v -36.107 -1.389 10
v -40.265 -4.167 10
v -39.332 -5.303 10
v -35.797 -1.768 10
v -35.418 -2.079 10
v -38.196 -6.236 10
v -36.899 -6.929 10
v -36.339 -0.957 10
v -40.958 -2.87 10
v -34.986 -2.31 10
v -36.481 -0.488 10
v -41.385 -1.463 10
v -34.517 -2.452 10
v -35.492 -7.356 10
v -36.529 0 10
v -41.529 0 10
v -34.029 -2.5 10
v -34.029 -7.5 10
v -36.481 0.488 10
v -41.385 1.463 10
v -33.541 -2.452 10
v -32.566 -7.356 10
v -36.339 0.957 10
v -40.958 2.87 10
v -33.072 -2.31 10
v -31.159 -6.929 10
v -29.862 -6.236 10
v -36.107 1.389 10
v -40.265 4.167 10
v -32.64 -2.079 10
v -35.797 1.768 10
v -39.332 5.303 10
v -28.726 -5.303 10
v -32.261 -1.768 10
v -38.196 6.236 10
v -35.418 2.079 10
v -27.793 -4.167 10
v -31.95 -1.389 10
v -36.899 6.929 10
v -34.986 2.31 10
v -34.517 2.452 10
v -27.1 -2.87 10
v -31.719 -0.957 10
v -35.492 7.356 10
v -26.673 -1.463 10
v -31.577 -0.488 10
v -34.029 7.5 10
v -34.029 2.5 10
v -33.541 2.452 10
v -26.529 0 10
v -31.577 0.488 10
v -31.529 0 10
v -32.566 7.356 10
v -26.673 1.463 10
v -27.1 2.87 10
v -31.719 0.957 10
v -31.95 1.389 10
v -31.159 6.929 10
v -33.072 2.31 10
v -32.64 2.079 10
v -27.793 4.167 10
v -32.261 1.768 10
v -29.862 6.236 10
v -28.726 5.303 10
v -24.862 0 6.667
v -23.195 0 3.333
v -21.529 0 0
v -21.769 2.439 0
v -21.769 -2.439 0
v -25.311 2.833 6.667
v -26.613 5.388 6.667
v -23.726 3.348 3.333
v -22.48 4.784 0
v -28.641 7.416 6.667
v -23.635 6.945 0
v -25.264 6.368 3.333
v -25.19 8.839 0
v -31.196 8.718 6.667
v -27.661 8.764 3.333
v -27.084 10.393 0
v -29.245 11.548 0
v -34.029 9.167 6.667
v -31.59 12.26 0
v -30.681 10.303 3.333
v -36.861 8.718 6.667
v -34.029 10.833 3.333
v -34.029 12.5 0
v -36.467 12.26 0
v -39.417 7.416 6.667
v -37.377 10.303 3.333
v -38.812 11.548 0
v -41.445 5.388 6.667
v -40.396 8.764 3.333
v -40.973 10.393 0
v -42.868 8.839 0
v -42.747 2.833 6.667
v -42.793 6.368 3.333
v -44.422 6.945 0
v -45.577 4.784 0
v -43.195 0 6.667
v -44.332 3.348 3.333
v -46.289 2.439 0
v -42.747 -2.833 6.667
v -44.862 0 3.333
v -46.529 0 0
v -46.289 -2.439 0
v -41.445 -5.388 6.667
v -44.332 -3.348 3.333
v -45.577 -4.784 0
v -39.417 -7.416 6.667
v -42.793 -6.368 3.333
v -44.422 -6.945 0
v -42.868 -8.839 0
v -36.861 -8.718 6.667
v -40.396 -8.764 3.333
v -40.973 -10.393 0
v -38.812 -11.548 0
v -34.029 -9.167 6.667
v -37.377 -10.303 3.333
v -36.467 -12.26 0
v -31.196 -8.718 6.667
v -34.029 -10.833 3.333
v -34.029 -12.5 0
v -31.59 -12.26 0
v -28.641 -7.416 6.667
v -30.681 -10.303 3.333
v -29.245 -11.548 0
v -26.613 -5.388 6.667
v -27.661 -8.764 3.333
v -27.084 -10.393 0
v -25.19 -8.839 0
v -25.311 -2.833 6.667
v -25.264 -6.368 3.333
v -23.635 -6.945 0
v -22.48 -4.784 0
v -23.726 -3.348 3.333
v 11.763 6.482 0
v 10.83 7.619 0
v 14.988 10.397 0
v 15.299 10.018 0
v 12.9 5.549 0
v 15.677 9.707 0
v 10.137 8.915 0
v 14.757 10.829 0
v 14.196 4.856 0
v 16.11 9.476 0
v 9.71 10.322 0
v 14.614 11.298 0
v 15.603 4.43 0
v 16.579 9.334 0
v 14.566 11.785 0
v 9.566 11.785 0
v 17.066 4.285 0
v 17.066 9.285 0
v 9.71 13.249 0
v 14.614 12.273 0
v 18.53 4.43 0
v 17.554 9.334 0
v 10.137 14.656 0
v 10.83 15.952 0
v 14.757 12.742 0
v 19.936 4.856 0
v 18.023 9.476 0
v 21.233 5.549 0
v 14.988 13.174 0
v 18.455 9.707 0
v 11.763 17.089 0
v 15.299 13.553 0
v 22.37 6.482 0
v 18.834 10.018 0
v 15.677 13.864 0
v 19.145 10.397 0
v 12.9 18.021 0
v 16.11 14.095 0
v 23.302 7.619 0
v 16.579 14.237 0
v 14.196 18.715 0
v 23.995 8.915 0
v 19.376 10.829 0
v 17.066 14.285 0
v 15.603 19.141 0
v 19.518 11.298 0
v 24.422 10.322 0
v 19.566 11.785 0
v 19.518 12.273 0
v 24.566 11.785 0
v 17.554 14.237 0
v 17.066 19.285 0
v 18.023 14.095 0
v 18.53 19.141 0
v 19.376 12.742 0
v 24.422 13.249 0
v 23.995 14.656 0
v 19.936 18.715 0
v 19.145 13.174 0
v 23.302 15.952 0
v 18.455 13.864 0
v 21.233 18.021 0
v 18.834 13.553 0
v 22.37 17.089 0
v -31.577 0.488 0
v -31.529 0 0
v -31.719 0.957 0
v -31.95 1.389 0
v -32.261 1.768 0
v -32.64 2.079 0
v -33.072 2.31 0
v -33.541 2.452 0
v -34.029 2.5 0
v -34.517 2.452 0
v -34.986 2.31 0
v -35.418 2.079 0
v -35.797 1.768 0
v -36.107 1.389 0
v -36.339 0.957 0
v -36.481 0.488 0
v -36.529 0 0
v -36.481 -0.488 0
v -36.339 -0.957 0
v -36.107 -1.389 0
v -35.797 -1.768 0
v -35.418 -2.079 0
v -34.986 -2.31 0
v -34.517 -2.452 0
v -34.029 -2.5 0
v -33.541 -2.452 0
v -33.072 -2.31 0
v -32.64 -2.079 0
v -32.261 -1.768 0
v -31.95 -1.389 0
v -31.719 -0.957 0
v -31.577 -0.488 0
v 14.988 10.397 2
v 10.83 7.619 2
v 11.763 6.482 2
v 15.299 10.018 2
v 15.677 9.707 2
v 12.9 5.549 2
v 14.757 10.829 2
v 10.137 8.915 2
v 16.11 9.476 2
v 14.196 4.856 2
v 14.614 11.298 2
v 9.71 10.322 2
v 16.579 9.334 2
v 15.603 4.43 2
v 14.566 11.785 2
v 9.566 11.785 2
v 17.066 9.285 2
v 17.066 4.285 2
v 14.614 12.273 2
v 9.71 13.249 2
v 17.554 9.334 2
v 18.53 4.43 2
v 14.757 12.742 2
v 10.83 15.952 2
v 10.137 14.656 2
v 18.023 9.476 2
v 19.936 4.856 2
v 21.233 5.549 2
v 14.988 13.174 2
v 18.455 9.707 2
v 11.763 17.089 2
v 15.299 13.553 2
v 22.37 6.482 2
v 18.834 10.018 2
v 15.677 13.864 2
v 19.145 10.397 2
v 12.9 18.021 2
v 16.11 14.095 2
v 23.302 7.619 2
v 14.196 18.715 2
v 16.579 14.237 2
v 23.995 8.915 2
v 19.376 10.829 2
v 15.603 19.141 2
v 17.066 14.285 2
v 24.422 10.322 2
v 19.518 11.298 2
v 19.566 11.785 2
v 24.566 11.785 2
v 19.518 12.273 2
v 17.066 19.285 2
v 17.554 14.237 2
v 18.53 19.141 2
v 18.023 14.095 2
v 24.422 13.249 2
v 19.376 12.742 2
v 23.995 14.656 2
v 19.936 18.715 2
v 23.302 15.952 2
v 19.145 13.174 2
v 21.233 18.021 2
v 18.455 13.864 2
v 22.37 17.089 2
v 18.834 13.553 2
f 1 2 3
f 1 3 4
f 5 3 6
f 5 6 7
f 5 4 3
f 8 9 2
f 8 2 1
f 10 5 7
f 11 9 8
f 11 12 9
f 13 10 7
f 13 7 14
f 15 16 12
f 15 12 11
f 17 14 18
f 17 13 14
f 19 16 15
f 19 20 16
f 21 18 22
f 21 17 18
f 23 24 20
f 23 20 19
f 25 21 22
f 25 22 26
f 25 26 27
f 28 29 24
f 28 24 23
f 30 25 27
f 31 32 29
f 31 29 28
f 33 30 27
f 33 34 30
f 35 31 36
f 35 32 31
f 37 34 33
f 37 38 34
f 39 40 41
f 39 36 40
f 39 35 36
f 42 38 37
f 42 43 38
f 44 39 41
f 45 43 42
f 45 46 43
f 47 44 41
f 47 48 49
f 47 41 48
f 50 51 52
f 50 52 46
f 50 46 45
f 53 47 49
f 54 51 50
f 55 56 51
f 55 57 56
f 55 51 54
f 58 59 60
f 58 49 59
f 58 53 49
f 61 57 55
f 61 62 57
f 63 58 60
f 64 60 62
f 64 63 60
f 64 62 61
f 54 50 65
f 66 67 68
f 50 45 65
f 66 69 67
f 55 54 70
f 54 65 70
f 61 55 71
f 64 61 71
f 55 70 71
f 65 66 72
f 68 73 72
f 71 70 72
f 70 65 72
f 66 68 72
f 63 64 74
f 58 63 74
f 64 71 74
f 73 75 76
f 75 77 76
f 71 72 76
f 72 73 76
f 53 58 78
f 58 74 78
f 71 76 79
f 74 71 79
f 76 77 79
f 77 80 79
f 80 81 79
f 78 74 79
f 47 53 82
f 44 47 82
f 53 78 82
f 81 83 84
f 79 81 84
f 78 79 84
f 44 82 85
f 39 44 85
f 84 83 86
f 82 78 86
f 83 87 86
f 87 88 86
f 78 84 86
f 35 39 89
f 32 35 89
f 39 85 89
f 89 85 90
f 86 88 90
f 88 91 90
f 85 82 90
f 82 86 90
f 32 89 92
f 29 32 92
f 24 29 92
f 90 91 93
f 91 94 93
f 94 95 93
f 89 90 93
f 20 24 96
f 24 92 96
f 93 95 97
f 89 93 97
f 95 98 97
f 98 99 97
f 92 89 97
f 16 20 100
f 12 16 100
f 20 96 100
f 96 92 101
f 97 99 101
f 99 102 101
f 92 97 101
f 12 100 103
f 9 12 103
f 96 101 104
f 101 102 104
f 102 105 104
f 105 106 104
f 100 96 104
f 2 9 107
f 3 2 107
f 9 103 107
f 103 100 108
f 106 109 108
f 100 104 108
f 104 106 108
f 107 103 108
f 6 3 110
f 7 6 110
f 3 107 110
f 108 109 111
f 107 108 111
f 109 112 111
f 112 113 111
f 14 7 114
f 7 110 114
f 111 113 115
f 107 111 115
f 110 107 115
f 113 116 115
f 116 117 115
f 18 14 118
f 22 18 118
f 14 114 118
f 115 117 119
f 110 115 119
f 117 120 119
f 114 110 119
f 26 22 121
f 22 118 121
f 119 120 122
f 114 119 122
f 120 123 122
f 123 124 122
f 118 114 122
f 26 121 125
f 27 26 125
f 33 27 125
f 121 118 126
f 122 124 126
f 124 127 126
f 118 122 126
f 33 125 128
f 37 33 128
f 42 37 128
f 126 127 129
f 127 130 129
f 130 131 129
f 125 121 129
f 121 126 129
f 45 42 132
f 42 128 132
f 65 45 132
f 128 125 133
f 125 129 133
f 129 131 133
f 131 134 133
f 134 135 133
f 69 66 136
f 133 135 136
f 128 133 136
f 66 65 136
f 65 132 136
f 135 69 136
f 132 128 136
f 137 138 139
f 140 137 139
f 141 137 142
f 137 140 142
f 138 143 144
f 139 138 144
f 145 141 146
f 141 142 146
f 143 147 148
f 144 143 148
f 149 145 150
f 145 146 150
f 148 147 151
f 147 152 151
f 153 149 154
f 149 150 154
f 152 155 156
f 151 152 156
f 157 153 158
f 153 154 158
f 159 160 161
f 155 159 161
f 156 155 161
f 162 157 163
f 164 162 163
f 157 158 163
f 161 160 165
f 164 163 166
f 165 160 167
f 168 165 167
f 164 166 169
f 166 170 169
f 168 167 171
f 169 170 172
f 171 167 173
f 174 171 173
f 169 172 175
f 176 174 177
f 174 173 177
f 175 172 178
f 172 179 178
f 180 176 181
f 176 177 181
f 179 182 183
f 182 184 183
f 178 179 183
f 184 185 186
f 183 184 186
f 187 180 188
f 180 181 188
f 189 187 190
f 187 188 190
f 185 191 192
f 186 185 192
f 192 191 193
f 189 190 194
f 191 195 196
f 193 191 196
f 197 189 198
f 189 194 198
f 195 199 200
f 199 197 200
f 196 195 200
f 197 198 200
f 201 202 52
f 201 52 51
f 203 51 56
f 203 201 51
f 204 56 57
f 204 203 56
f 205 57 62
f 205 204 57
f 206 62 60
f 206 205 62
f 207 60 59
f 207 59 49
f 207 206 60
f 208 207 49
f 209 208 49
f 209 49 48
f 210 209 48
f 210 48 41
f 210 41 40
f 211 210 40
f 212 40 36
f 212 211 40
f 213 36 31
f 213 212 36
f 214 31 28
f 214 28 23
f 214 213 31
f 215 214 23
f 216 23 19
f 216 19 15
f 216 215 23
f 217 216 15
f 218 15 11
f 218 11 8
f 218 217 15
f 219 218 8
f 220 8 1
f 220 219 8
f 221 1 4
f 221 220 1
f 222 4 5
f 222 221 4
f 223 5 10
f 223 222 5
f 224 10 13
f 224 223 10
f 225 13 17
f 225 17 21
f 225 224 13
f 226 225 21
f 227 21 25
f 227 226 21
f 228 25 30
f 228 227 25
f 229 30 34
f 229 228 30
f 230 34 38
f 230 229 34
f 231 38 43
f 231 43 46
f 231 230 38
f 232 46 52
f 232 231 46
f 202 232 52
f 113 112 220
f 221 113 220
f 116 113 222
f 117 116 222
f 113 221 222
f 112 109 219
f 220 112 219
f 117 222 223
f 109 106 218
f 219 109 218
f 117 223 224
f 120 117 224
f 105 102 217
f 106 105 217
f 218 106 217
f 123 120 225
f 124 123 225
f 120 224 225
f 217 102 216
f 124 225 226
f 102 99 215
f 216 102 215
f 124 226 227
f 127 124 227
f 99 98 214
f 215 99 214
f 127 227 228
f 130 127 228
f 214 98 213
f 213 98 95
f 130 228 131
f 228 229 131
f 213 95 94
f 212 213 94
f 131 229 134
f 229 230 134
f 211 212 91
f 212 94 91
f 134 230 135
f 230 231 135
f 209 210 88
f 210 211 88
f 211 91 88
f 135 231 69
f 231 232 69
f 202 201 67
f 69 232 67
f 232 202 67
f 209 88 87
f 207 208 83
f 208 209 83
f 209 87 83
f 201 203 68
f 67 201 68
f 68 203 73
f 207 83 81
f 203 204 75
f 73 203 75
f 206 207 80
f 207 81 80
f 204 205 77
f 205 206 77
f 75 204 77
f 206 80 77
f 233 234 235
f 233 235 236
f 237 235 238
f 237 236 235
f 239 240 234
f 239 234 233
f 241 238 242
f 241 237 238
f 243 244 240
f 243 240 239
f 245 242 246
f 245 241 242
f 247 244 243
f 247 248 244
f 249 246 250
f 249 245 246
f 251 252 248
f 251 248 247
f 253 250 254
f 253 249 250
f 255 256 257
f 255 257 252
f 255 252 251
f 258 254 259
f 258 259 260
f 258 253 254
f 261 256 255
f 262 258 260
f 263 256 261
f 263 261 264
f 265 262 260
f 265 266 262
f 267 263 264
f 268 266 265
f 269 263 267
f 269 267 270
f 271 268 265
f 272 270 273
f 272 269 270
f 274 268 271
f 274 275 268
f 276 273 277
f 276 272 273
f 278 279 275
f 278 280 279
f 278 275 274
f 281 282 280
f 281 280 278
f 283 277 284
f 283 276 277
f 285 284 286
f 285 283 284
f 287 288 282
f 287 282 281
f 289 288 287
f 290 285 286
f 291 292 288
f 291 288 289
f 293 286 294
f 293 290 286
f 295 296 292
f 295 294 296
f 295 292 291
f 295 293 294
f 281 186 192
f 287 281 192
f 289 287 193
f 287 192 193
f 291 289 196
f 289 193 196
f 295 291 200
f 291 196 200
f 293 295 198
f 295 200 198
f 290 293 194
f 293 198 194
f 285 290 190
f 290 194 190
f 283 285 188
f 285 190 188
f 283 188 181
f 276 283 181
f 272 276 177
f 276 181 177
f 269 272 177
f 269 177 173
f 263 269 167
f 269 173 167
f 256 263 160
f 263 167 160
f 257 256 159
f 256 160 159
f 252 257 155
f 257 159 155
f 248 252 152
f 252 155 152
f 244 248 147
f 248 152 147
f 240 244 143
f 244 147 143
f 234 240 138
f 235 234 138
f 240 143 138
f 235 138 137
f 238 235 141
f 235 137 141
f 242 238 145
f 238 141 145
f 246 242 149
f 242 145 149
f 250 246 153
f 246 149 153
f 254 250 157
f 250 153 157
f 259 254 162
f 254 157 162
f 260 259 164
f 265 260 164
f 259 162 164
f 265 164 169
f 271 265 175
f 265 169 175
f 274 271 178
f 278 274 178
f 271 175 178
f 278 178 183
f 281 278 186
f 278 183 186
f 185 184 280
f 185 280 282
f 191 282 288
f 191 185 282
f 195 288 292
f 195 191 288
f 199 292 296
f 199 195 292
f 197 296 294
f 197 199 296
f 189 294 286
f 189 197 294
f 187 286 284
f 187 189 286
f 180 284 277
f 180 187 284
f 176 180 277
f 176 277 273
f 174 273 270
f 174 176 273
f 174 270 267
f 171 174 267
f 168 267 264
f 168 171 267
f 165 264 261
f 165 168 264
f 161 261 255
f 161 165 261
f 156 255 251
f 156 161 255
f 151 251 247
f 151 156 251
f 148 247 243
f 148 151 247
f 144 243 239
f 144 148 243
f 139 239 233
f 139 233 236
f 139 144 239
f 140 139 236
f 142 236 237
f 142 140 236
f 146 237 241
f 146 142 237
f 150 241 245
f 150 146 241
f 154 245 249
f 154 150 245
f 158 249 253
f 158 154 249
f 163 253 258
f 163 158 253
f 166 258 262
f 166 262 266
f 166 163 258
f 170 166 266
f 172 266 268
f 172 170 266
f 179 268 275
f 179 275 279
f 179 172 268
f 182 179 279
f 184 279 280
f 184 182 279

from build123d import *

# Parameters (mm, degrees)
F0_R     = 12.5
F0_R_2   = 2.5
F1_DEPTH = 10
F0_R_3   = 7.5
F2_DEPTH = 2
F3_SIZE2 = 9.99999
F3_SIZE  = 4.99999


# Not quite as in the source:
# - a fillet or chamfer is up to 0.001 mm smaller than in the source, because OpenCascade refuses the exact size


with BuildPart() as f1:
    # F0 (on Top) → F1 (new body)
    with BuildSketch(Plane.XY):
        with Locations((-34.0288244188, 0)):
            Circle(F0_R)
        with Locations((-34.0288244188, 0)):
            Circle(F0_R_2, mode=Mode.SUBTRACT)
    extrude(amount=F1_DEPTH)

    # F3 (size 5 and 10 in the source; OpenCascade refuses exactly that, so slightly less here)
    f3_edges = [f1.edges().sort_by_distance(p)[0] for p in [
        (-46.528824, 0, 10),
    ]]
    f3_side = f1.faces().sort_by_distance((-46.175271, 0, 10))[0]
    chamfer(f3_edges, length=F3_SIZE, length2=F3_SIZE2, reference=f3_side)


with BuildPart() as f2:
    # F0 (on Top) → F2 (new body)
    with BuildSketch(Plane.XY):
        with Locations((17.0663259923, 11.785466224)):
            Circle(F0_R_3)
        with Locations((17.0663259923, 11.785466224)):
            Circle(F0_R_2, mode=Mode.SUBTRACT)
    extrude(amount=F2_DEPTH)


solid = Compound([f1.part, f2.part])
